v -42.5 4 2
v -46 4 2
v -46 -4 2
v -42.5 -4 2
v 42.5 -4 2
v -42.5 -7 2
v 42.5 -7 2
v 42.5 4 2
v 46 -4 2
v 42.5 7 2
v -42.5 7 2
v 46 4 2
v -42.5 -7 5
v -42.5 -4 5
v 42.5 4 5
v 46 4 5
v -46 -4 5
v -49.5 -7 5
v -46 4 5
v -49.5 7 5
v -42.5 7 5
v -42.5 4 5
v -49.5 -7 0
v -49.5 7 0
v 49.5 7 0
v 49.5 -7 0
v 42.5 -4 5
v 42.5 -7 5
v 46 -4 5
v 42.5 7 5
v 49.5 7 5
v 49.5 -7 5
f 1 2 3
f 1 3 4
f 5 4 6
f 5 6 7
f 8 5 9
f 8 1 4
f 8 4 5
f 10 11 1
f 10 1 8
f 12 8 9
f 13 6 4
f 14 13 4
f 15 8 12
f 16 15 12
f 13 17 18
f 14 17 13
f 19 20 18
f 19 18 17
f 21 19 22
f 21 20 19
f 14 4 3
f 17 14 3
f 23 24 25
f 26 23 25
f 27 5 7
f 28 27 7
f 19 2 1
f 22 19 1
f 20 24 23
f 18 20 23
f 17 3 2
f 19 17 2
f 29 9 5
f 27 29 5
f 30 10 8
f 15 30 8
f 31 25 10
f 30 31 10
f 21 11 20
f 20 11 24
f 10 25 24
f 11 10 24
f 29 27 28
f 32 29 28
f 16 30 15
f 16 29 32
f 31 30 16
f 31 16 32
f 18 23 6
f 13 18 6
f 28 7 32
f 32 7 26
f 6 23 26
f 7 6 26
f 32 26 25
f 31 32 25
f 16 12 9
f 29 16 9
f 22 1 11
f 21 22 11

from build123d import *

# Parameters (mm, degrees)
F1_DEPTH = 2
F2_DEPTH = 5
F3_DEPTH = 5


with BuildPart() as f1:
    # F0 (on Top) → F1 (new body)
    with BuildSketch(Plane.XY):
        Polygon((42.5, 4), (42.5, 7), (-42.5, 7), (-42.5, 4), (-46, 4), (-46, -4), (-42.5, -4), (-42.5, -7), (42.5, -7), (42.5, -4), (46, -4), (46, 4), align=None)
    extrude(amount=F1_DEPTH)

    # F0 (on Top) → F2 (join)
    with BuildSketch(Plane.XY):
        Polygon((-42.5, 4), (-42.5, 7), (-49.5, 7), (-49.5, -7), (-42.5, -7), (-42.5, -4), (-46, -4), (-46, 4), align=None)
    extrude(amount=F2_DEPTH)

    # F0 (on Top) → F3 (join)
    with BuildSketch(Plane.XY):
        Polygon((49.5, -7), (49.5, 7), (42.5, 7), (42.5, 4), (46, 4), (46, -4), (42.5, -4), (42.5, -7), align=None)
    extrude(amount=F3_DEPTH)


solid = f1.part
